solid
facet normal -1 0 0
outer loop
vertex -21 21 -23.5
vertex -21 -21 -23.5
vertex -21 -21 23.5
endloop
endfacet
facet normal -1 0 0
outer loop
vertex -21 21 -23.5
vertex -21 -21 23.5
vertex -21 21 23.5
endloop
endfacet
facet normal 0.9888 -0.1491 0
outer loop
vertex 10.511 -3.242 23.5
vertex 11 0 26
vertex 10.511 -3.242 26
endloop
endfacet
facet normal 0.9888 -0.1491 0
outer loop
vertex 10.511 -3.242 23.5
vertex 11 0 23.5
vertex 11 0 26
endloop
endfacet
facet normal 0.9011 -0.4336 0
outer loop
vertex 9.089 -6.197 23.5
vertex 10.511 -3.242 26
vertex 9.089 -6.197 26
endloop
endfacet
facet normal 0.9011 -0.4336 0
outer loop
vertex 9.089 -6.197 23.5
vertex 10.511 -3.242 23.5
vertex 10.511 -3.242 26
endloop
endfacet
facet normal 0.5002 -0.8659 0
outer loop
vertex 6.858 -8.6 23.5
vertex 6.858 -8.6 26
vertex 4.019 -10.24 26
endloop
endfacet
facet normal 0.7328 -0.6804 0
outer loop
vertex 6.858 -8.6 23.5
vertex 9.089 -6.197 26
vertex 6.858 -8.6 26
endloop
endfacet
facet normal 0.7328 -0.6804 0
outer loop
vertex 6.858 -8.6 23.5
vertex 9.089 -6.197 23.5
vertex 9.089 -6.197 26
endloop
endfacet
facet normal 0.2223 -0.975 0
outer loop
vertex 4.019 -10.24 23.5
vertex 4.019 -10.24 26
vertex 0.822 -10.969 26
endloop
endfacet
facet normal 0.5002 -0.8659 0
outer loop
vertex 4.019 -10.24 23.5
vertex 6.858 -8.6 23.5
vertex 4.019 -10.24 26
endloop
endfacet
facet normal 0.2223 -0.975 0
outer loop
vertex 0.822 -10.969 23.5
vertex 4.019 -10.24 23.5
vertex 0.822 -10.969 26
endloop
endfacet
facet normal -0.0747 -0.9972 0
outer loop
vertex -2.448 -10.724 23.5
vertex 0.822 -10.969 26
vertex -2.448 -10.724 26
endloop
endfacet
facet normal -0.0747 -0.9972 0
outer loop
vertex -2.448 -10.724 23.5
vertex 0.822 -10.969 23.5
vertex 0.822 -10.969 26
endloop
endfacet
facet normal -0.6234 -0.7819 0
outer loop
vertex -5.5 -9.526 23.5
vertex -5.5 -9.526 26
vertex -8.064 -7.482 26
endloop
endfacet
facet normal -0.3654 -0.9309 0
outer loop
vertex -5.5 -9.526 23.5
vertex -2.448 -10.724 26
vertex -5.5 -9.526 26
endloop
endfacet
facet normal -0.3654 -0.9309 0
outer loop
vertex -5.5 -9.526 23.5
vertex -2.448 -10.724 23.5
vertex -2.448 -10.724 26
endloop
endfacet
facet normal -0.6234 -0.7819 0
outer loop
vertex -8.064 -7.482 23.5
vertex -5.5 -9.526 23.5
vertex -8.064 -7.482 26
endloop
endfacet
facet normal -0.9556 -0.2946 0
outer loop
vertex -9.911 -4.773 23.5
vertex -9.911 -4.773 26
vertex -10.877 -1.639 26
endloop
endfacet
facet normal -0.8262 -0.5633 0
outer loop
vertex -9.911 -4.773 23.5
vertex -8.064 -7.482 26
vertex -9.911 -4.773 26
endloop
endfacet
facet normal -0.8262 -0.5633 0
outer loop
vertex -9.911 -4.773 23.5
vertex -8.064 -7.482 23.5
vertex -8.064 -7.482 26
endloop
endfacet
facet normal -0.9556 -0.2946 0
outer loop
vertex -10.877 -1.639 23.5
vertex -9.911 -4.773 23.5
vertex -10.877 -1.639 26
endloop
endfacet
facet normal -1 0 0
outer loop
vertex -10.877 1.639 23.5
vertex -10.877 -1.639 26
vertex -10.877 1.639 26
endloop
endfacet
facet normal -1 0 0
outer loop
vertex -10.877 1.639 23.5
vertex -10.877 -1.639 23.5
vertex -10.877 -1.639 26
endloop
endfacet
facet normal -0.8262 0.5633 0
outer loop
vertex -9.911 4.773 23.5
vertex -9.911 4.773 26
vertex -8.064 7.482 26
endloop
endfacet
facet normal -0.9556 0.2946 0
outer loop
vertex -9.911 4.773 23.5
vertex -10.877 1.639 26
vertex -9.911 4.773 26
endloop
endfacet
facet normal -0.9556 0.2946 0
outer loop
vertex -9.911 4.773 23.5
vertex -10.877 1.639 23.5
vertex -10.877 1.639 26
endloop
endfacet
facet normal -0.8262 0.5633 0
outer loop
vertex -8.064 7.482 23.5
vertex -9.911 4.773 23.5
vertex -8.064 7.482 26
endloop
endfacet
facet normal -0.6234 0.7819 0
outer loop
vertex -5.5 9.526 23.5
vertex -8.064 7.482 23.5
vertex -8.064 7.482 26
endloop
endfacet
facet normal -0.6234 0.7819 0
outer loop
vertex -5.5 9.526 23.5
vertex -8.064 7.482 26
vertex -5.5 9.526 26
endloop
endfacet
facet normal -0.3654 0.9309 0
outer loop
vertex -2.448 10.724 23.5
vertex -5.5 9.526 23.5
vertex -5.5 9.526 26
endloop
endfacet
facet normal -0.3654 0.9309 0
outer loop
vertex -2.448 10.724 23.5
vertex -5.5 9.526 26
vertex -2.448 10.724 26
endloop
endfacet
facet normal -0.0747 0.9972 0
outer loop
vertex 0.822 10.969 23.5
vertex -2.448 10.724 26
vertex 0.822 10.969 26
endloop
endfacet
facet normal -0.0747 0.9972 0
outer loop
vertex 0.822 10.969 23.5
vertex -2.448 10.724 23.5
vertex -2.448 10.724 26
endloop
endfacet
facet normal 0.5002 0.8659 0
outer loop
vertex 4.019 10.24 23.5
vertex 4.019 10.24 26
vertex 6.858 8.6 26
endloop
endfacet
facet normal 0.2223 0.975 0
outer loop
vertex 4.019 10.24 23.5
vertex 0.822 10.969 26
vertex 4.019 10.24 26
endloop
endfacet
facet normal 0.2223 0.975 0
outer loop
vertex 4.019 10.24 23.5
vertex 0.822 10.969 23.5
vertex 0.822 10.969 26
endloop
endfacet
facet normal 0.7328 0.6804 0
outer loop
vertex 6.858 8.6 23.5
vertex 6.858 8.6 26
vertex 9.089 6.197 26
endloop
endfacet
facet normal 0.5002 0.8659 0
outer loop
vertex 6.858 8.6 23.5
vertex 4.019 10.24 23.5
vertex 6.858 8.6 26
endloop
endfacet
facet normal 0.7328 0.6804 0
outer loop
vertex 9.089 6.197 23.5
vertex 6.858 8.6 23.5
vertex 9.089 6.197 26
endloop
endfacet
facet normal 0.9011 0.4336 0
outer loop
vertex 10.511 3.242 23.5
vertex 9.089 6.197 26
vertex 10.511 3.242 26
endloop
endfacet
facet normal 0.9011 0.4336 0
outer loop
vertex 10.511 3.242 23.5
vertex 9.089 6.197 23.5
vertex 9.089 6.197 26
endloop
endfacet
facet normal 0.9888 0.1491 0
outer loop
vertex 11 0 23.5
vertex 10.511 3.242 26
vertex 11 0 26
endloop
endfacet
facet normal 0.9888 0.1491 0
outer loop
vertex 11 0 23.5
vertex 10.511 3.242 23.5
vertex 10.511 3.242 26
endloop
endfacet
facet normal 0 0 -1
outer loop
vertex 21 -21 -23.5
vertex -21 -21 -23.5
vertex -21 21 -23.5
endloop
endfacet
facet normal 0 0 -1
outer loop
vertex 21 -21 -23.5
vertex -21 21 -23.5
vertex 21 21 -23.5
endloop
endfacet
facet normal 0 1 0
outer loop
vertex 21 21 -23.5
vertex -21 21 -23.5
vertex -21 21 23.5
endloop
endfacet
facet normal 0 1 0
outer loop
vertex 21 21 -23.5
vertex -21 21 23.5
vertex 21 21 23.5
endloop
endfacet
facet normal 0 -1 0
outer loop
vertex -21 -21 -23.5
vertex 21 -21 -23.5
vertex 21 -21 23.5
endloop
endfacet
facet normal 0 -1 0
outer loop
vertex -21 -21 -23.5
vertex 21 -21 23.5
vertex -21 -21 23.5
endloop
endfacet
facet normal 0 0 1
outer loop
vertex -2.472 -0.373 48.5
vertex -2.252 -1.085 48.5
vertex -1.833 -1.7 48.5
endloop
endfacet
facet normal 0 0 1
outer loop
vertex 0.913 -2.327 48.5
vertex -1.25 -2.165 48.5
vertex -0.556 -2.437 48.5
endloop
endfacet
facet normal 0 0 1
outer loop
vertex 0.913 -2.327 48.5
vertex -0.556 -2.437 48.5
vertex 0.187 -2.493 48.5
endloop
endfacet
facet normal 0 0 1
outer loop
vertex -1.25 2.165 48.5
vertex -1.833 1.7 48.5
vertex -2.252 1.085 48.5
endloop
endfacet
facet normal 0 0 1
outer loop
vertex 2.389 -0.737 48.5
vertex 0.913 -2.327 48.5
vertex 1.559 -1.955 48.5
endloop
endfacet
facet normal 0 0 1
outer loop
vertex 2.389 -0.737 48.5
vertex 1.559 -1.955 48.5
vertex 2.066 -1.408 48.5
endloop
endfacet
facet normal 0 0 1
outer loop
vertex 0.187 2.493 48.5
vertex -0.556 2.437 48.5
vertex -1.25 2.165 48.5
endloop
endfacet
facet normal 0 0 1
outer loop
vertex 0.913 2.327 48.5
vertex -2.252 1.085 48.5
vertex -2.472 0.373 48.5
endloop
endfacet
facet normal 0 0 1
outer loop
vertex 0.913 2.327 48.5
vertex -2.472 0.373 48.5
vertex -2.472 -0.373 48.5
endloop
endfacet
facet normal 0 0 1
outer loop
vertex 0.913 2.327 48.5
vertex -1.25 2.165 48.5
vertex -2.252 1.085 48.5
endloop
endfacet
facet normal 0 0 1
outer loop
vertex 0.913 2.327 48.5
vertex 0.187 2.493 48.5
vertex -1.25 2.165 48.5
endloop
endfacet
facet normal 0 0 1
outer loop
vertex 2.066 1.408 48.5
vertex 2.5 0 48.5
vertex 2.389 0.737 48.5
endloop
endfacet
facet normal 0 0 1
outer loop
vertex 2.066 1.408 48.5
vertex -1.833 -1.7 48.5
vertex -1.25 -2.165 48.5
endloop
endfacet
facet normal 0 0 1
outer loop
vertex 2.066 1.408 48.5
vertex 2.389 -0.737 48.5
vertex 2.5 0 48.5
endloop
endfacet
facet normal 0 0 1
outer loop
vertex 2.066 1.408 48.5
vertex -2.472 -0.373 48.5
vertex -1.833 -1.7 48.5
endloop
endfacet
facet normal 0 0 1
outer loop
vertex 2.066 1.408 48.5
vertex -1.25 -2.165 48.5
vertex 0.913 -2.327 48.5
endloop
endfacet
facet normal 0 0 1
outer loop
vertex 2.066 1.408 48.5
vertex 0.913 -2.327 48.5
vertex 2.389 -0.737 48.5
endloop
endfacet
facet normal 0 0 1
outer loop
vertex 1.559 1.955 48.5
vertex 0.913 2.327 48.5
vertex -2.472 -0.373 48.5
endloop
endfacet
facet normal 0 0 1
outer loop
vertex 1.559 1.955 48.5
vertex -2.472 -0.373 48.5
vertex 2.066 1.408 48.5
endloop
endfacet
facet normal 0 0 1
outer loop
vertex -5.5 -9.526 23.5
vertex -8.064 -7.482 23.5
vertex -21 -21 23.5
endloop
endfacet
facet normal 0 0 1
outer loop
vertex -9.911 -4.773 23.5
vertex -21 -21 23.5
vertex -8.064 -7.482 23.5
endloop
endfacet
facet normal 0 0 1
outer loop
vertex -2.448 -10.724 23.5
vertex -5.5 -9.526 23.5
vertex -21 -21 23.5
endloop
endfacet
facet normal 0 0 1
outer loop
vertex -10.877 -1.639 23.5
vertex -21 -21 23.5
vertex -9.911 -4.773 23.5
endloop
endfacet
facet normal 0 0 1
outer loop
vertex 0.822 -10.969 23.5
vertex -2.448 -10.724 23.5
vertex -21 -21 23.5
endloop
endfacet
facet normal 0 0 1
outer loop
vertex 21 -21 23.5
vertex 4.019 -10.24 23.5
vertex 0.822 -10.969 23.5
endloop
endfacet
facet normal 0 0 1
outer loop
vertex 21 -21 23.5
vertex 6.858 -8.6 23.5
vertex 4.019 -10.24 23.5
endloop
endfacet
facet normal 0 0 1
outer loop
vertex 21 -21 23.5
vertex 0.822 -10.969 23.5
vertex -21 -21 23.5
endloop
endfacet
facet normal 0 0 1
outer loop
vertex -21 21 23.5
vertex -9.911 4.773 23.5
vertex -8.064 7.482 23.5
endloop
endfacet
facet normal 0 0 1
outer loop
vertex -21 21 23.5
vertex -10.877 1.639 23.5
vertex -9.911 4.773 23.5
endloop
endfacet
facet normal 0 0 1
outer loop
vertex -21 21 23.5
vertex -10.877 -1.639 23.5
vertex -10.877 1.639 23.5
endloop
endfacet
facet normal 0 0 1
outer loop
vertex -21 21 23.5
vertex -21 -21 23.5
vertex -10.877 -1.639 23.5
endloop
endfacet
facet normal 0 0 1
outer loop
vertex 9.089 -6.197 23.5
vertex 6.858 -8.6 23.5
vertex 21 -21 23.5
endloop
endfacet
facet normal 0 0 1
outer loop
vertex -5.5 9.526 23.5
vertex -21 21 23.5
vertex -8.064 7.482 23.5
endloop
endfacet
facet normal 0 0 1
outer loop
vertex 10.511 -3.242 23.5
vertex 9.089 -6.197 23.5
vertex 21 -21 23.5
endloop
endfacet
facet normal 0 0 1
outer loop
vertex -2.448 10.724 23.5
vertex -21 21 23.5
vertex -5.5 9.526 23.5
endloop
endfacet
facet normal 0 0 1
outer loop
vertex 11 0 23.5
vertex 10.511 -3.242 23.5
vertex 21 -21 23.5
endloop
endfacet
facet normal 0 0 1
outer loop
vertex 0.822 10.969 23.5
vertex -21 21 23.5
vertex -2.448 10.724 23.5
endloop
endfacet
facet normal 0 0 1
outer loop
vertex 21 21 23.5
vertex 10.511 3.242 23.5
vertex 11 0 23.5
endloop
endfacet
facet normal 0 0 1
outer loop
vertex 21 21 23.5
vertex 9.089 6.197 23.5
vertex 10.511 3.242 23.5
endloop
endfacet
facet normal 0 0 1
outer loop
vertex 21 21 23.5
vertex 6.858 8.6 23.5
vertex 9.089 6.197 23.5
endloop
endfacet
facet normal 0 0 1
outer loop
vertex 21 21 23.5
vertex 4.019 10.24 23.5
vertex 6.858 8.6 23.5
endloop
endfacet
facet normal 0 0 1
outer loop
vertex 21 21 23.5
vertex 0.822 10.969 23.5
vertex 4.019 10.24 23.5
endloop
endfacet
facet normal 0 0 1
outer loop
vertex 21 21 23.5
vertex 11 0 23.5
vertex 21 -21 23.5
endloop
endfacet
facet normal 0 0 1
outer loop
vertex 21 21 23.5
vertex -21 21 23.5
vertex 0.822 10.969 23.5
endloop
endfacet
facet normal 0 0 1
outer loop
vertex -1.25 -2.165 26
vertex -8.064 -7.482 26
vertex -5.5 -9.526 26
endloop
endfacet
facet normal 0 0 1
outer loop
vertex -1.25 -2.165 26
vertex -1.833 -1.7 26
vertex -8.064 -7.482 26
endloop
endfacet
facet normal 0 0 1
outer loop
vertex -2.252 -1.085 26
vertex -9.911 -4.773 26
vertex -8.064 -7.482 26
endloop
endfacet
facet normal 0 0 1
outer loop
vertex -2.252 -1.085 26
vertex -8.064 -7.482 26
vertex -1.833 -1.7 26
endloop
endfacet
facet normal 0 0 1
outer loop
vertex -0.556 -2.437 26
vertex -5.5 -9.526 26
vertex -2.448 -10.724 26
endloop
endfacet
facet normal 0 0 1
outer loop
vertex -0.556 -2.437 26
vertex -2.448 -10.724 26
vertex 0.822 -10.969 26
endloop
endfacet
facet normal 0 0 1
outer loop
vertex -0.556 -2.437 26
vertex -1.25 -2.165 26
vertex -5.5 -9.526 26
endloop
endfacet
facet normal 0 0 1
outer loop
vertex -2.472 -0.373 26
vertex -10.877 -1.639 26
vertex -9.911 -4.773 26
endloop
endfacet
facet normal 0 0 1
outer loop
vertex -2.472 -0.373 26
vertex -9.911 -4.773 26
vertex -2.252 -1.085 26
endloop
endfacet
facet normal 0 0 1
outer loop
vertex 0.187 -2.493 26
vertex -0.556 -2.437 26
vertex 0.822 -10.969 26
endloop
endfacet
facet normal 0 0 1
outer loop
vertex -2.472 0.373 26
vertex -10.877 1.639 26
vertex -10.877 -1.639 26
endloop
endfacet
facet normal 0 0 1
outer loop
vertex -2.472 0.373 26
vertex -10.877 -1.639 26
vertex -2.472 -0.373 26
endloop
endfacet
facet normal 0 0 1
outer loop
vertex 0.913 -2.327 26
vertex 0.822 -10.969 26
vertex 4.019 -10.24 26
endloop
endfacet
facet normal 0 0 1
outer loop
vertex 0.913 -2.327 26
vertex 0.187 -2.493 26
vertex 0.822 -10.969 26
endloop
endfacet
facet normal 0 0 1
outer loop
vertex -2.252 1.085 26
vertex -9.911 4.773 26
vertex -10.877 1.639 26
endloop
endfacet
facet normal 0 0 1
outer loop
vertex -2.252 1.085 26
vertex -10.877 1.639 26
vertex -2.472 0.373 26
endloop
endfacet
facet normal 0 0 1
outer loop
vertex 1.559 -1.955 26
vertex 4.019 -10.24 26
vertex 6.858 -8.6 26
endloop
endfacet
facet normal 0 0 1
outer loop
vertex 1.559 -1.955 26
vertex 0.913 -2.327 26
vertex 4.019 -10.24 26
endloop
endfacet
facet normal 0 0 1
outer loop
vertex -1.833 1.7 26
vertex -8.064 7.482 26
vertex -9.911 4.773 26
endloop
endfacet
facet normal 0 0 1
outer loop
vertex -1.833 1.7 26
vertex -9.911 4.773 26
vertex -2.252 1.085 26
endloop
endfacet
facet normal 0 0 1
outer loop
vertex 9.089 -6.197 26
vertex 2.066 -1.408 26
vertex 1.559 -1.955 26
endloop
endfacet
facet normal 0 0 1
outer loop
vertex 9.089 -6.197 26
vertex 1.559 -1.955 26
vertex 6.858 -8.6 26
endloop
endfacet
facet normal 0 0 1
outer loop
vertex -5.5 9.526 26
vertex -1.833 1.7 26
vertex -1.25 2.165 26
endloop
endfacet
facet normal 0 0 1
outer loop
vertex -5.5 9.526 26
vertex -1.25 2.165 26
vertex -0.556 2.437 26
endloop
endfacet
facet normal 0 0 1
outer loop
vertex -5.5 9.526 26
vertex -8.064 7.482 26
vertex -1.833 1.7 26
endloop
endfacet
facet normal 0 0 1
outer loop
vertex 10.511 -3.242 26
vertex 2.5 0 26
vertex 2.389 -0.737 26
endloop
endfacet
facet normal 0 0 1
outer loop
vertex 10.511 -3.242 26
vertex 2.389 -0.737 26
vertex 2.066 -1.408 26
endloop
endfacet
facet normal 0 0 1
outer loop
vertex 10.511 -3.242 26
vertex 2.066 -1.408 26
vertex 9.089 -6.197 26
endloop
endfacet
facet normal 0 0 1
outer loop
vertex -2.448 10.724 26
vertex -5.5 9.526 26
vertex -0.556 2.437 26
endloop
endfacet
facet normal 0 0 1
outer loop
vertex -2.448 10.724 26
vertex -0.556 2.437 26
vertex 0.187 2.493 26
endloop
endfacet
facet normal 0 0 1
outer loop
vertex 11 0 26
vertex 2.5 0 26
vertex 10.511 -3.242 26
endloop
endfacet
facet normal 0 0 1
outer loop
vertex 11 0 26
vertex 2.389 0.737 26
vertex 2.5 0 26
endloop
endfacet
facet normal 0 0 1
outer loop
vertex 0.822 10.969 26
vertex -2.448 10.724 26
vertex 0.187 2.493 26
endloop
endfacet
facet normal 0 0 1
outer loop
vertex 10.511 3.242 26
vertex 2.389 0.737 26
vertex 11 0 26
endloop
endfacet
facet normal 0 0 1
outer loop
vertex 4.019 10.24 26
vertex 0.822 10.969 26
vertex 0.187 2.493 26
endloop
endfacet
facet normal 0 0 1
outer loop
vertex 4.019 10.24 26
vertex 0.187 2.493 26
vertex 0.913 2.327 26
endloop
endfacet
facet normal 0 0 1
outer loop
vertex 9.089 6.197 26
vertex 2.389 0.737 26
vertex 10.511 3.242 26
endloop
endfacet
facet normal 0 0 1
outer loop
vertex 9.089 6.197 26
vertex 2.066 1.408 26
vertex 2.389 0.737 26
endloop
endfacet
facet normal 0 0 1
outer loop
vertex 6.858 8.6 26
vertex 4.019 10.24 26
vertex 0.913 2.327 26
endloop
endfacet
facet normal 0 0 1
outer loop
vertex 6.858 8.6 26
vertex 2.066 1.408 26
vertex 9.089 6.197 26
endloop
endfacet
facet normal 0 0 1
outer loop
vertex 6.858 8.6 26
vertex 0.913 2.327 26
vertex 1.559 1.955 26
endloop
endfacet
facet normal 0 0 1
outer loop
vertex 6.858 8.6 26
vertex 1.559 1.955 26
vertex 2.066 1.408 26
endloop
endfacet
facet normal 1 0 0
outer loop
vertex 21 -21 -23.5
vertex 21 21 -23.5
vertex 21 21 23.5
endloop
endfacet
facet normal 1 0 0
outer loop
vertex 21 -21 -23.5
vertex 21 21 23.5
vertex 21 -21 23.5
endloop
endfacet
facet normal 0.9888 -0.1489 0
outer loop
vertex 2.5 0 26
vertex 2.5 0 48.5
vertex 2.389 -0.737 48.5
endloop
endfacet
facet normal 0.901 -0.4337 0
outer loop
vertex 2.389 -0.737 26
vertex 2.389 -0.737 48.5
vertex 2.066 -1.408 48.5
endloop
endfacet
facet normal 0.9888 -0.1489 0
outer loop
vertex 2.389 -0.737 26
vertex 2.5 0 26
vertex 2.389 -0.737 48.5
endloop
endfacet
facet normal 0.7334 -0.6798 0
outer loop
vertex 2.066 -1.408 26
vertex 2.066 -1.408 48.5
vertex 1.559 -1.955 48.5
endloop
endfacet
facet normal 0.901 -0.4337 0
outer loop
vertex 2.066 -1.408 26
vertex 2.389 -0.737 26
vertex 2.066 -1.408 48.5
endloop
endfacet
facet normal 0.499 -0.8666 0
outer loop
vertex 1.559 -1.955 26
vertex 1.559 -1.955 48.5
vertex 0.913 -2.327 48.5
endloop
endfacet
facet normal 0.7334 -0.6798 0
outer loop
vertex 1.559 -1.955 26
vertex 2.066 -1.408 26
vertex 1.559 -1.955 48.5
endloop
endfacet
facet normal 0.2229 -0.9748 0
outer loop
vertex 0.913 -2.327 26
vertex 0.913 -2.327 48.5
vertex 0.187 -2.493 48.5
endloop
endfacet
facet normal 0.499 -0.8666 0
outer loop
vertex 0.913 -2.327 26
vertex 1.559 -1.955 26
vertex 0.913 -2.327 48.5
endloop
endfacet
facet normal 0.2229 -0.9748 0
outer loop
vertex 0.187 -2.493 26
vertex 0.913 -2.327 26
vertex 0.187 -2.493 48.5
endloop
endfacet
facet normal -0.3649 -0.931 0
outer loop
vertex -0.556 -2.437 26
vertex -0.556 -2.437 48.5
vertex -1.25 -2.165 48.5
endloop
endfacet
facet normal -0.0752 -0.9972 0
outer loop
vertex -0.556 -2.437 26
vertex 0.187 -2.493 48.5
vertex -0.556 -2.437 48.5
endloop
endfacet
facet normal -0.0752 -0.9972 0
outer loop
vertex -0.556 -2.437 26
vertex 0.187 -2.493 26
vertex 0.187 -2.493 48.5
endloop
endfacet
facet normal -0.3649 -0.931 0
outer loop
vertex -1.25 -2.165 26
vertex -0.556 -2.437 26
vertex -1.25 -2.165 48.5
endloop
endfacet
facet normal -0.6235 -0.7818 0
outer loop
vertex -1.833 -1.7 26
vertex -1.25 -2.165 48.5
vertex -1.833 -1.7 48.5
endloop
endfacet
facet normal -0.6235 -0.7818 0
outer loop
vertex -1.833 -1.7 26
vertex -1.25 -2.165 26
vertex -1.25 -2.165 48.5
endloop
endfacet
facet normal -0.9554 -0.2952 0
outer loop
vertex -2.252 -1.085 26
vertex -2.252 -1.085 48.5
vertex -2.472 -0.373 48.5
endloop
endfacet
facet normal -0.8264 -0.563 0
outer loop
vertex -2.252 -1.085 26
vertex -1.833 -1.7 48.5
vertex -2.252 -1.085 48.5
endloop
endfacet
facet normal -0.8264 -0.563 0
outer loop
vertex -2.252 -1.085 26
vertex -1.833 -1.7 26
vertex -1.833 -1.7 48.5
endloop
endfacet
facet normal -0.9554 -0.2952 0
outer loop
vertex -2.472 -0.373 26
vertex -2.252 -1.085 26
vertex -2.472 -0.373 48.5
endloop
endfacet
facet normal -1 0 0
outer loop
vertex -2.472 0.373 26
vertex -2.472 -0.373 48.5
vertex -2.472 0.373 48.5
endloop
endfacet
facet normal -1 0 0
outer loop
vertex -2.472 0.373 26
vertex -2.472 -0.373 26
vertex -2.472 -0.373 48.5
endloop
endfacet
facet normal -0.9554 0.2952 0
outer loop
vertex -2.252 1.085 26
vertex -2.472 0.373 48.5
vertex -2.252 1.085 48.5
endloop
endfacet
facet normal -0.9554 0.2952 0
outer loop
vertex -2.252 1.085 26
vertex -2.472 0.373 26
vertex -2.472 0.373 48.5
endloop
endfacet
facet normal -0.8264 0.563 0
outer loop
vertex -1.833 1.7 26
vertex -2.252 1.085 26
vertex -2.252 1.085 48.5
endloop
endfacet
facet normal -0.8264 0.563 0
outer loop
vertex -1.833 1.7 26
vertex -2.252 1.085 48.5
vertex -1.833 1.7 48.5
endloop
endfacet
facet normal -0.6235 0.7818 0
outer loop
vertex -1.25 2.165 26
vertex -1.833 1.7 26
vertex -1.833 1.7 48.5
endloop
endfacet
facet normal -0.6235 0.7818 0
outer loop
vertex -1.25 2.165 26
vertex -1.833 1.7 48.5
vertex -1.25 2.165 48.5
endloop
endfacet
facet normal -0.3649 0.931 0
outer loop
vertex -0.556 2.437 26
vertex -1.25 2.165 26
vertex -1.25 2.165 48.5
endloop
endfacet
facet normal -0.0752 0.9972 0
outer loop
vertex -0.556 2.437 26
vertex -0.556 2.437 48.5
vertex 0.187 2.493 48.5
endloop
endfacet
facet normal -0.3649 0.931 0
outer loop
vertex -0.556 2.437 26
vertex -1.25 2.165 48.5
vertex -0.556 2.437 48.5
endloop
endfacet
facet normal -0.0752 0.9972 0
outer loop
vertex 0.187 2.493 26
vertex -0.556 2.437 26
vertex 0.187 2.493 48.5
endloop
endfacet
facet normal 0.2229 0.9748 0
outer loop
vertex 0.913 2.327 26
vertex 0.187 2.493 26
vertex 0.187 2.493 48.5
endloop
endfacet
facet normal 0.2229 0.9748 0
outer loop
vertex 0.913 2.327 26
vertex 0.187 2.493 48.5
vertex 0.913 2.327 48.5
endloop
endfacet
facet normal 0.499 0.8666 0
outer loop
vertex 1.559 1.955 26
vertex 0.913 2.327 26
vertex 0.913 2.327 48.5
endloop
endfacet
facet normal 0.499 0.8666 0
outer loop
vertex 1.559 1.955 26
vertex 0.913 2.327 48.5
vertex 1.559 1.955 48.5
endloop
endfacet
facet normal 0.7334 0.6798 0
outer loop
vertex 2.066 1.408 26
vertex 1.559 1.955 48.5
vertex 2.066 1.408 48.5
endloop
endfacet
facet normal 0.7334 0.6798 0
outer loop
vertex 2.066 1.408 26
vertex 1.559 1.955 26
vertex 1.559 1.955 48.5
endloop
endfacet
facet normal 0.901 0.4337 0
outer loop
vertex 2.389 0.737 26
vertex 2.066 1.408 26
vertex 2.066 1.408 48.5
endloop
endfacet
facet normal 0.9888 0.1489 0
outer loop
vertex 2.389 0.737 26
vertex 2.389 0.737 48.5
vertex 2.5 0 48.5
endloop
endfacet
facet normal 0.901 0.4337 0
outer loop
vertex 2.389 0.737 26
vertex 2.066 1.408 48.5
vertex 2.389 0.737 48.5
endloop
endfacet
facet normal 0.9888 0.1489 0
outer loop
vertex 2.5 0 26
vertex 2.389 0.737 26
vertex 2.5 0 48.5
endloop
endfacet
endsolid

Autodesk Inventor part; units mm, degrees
ref_plane "YZ Plane" through (0, 0, 0) normal (1, 0, 0) x (0, 1, 0)
ref_plane "XZ Plane" through (0, 0, 0) normal (0, 1, 0) x (-1, 0, 0)
ref_plane "XY Plane" through (0, 0, 0) normal (0, 0, 1) x (1, 0, 0)
sketch "Sketch1" plane through (0, 0, 0) normal (0, 0, 1) x (1, 0, 0)
  line L0 (-21, 21) -> (21, 21)
  line L1 (21, 21) -> (21, -21)
  line L2 (21, -21) -> (-21, -21)
  line L3 (-21, -21) -> (-21, 21)
  line L4 (-21, 21) -> (21, -21) construction
  line L5 (21, 21) -> (-21, -21) construction
  point P0 (0, 0)
  dimension "d0" = 42
  dimension "d1" = 42
extrude "Extrusion1" add sketch "Sketch1" along normal mid plane 47
sketch "Sketch2" plane through (0, 0, 23.5) normal (0, 0, 1) x (1, 0, 0)
  circle A0 centre (0, 0) radius 2.5
  dimension "d4" = 5
extrude "Extrusion2" add sketch "Sketch2" along normal blind 25
sketch "Sketch3" plane through (0, 0, 23.5) normal (0, 0, 1) x (1, 0, 0)
  circle A0 centre (0, 0) radius 11
  dimension "d7" = 22
extrude "Extrusion3" add sketch "Sketch3" along normal blind 2.5
properties part number "NEMA 17 PARA TAPA PRINCIPAL"
